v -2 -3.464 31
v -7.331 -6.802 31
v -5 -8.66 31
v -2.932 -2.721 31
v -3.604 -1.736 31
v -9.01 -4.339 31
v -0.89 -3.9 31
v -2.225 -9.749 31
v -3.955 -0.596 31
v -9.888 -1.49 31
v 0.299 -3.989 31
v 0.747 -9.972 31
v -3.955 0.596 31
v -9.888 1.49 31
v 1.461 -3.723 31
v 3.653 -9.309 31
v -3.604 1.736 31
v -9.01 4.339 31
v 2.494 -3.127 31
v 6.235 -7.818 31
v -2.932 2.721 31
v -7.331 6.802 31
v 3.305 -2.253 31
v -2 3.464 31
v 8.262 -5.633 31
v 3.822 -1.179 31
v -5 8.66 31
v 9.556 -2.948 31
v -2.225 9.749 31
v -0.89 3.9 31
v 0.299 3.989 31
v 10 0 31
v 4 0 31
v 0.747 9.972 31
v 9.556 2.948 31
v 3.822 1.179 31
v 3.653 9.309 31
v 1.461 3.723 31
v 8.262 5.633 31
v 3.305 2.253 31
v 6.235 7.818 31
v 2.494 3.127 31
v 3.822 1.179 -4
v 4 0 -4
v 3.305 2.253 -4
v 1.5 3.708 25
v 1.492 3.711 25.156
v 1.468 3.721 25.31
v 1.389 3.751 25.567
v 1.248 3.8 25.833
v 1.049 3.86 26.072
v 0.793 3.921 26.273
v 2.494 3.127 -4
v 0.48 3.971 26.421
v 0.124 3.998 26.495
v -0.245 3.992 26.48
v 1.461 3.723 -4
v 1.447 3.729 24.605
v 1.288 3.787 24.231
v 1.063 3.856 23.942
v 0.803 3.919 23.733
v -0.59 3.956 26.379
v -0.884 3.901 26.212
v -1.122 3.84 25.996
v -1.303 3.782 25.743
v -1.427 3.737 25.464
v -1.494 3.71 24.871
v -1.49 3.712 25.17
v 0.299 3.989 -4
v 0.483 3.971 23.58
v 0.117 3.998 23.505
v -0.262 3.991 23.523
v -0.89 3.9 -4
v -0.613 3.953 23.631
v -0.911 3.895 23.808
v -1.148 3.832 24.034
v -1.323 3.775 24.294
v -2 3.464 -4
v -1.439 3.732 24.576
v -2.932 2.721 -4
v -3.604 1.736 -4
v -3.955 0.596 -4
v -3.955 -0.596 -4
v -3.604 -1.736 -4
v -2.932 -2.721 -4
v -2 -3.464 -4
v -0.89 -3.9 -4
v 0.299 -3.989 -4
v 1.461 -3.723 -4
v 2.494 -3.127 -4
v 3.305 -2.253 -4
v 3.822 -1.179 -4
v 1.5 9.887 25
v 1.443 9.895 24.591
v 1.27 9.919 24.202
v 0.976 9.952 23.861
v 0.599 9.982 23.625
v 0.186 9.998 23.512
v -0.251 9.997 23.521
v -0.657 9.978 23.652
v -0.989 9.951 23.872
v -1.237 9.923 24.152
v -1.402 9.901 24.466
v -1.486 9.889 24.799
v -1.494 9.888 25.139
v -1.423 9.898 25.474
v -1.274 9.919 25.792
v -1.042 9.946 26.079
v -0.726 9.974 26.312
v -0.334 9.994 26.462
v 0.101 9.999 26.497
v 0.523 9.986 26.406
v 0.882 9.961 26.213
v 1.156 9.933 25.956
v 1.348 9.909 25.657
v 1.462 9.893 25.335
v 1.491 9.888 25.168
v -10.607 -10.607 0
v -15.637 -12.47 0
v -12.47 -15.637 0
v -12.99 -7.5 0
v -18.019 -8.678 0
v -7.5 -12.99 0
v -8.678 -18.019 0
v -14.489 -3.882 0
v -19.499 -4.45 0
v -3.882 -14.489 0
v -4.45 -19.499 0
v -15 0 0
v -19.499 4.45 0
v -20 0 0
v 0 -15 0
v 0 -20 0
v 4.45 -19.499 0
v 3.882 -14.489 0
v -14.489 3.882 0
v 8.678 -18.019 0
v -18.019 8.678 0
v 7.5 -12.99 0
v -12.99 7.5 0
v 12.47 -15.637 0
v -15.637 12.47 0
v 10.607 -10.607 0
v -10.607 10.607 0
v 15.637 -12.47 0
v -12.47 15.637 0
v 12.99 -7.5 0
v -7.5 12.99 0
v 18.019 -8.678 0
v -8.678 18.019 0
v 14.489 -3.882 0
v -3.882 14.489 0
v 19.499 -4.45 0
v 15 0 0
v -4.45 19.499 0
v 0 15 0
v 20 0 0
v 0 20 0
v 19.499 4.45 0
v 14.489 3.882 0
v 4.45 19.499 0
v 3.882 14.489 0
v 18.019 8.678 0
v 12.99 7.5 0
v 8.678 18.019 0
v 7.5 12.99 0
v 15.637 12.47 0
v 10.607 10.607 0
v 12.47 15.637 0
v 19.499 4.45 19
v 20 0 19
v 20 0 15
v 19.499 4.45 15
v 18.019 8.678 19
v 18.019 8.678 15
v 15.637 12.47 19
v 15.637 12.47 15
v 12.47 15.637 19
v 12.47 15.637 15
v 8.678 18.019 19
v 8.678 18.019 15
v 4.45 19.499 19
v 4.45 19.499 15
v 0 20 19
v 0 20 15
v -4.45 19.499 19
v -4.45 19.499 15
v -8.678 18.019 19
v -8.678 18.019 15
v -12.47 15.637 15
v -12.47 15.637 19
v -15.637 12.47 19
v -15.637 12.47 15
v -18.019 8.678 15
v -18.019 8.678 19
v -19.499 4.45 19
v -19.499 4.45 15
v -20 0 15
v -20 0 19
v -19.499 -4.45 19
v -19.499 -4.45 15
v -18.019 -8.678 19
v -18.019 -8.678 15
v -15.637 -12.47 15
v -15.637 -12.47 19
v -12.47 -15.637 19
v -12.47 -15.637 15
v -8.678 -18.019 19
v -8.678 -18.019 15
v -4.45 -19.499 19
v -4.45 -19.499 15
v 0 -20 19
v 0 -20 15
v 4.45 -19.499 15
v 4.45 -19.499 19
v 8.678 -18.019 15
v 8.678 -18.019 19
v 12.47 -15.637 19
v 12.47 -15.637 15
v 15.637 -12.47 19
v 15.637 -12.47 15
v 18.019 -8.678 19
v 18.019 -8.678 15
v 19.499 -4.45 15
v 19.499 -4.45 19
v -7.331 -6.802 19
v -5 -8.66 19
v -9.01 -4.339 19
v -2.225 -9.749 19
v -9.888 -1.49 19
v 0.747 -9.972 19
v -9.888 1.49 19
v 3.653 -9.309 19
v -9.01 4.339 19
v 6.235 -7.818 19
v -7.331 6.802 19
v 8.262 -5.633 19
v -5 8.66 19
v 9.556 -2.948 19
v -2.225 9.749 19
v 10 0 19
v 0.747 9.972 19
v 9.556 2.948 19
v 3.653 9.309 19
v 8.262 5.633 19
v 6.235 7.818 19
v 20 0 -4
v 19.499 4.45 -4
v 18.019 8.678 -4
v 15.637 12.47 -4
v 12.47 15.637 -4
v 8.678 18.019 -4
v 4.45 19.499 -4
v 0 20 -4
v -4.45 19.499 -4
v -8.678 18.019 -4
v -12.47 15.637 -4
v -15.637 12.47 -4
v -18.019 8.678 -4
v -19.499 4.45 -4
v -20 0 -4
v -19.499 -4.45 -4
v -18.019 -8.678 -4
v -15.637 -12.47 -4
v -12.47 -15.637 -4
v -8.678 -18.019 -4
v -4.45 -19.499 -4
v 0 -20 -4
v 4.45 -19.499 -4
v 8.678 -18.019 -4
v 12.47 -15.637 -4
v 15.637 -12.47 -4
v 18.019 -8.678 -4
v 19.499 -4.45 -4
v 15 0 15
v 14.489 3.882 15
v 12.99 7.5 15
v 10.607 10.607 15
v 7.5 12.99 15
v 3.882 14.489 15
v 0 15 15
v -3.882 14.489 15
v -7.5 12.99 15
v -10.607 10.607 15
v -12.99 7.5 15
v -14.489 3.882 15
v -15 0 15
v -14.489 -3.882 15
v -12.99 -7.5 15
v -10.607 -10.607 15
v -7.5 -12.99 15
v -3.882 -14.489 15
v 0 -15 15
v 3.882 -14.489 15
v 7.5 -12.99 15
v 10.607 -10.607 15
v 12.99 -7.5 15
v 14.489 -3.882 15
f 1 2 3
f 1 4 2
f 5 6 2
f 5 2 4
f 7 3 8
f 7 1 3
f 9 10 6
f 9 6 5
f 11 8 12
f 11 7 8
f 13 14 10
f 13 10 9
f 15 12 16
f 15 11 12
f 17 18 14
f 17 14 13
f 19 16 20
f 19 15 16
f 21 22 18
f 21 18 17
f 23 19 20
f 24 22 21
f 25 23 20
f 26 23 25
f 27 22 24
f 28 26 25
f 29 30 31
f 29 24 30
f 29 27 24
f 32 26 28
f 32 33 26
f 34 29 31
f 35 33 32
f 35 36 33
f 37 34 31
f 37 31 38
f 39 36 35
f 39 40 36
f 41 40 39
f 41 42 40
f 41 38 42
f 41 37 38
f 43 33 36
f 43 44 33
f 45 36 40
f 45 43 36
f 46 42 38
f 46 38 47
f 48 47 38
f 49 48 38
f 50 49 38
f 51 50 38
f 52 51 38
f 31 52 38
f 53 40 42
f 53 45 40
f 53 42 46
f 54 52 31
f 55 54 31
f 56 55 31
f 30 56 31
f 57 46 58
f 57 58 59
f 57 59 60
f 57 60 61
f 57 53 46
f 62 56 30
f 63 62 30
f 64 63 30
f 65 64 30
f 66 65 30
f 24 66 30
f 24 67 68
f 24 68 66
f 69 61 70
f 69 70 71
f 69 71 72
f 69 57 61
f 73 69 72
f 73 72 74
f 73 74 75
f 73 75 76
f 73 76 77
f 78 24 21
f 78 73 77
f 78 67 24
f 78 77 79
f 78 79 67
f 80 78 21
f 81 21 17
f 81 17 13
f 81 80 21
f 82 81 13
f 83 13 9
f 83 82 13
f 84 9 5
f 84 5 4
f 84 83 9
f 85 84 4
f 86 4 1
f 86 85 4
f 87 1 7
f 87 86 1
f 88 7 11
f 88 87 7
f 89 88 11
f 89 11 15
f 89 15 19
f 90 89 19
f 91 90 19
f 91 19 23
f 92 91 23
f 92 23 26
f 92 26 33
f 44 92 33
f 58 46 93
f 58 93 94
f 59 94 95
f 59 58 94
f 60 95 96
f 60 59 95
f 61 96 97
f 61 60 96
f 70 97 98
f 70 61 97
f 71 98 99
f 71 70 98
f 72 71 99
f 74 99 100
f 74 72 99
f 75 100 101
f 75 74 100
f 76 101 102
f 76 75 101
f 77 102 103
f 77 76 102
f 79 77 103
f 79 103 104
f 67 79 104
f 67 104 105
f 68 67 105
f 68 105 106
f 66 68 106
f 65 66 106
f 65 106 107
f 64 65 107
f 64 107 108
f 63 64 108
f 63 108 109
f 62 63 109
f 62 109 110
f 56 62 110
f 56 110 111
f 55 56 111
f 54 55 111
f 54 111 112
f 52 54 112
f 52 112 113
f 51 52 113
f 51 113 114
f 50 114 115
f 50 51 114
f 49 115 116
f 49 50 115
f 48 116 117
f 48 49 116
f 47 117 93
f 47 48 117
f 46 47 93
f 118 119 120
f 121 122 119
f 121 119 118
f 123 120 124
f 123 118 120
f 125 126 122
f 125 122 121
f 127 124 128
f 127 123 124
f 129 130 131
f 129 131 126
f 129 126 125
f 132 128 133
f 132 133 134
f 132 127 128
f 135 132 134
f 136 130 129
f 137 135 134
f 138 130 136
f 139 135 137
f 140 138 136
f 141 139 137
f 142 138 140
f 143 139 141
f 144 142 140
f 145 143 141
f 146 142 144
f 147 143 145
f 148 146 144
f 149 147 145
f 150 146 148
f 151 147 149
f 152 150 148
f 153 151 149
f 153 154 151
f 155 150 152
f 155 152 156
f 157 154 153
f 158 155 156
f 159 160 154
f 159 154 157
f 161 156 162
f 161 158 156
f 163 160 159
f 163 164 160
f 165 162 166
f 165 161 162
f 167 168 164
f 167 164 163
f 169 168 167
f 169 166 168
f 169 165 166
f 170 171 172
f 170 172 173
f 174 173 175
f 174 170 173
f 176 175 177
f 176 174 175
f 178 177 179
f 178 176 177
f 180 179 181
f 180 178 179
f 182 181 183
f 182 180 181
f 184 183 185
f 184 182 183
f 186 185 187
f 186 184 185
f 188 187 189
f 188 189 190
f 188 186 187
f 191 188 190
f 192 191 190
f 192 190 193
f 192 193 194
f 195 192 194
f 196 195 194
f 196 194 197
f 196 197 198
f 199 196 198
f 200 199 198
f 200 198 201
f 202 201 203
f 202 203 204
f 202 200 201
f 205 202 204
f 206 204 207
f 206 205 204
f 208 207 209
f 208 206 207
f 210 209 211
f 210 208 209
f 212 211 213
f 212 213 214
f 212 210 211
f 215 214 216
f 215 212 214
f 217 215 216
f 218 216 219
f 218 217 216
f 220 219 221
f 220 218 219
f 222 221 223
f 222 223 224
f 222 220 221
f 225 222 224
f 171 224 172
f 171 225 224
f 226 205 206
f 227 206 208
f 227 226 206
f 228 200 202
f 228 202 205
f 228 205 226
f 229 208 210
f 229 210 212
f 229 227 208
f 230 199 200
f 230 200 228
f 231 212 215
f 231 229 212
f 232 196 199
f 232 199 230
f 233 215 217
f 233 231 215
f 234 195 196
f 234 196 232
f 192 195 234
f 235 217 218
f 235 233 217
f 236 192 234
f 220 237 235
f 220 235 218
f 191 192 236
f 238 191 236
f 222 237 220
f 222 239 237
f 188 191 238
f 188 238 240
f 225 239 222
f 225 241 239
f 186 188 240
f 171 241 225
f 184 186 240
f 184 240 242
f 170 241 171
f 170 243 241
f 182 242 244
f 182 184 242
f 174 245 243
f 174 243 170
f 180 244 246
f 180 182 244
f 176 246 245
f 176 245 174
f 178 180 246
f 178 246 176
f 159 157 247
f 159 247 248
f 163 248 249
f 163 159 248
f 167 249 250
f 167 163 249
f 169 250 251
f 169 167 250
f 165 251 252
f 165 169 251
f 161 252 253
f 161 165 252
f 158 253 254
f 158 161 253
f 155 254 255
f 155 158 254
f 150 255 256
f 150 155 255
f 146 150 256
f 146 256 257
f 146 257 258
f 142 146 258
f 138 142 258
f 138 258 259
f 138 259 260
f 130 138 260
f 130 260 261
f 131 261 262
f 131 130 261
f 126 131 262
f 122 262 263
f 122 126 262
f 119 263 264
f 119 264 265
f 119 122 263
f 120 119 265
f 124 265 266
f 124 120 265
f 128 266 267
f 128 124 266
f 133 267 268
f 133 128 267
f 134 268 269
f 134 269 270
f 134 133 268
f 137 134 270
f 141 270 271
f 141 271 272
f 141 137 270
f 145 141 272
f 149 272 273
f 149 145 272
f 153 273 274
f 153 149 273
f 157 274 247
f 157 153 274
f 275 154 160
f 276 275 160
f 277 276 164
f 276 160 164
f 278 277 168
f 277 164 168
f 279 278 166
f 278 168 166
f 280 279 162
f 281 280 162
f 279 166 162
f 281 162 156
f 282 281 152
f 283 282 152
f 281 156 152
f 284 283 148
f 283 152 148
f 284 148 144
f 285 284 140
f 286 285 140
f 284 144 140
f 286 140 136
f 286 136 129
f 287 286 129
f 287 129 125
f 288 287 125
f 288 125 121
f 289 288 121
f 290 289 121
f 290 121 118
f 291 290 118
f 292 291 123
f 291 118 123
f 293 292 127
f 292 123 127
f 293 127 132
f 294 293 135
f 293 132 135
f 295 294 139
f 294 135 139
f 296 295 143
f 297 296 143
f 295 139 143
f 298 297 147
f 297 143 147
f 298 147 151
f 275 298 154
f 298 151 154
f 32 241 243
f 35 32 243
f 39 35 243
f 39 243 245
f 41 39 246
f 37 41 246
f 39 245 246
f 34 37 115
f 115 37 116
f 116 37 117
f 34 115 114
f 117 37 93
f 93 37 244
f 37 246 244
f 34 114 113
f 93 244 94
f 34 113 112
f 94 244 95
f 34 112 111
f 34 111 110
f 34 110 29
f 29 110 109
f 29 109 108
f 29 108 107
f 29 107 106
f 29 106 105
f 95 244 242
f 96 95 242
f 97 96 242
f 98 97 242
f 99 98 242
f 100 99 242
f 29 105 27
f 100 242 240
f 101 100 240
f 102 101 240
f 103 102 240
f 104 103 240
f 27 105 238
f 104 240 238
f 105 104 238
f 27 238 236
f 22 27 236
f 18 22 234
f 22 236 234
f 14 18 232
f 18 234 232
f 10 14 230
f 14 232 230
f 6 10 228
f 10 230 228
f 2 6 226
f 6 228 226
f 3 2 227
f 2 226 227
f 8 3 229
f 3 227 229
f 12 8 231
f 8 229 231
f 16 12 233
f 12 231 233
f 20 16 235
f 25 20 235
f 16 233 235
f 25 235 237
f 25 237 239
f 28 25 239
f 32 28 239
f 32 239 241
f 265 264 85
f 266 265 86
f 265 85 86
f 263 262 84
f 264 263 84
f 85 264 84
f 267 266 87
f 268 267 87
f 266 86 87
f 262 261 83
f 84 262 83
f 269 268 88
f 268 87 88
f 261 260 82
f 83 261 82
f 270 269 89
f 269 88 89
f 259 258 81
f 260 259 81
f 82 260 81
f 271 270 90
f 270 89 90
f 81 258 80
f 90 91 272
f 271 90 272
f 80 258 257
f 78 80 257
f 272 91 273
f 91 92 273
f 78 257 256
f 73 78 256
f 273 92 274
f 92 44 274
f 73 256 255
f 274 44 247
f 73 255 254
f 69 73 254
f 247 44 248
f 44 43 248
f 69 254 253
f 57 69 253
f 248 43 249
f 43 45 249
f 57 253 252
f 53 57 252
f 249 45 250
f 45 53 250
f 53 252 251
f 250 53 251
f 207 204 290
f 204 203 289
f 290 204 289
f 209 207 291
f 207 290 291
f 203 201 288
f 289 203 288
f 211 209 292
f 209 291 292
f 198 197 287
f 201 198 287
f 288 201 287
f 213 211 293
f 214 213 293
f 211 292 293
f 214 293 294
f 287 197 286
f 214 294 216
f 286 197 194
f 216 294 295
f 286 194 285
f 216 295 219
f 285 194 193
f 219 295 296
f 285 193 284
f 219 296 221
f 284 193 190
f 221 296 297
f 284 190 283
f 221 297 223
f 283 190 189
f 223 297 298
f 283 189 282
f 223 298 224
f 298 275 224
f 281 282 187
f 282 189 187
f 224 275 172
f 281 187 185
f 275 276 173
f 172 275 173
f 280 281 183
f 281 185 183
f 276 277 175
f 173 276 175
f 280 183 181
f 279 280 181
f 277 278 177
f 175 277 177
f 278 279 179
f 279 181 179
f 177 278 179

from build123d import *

# Parameters (mm, degrees)
SKETCH_1_R          = 20
EXTRUDE_1_DEPTH     = 4
SKETCH_1_3_R        = 15
EXTRUDE_2_DEPTH     = 15
EXTRUDE_START       = 4
SKETCH_2_R          = 20
EXTRUDE_3_DEPTH     = 4
SKETCH_3_R          = 10
SKETCH_3_R_2        = 4
EXTRUDE_4_DEPTH     = 12
SKETCH_4_R          = 1.5
CUT_EXTRUDE_1_DEPTH = 18
CUT_EXTRUDE_START   = -27
SKETCH_3_3_R        = 4
CUT_EXTRUDE_2_DEPTH = 27


with BuildPart() as part:
    # 스케치1 → 보스-돌출1 (new body)
    with BuildSketch(Plane.XY):
        Circle(SKETCH_1_R)
    extrude(amount=-EXTRUDE_1_DEPTH)

    # 스케치1<3> → 보스-돌출2 (add)
    with BuildSketch(Plane.XY):
        Circle(SKETCH_1_3_R)
    extrude(amount=EXTRUDE_2_DEPTH)

    # 스케치2 → 보스-돌출3 (add)
    with BuildSketch(Plane.XY.offset(15).offset(EXTRUDE_START)):
        Circle(SKETCH_2_R)
    extrude(amount=-EXTRUDE_3_DEPTH)

    # 스케치3 → 보스-돌출4 (add)
    with BuildSketch(Plane.XY.offset(19)):
        Circle(SKETCH_3_R)
        Circle(SKETCH_3_R_2, mode=Mode.SUBTRACT)
    extrude(amount=EXTRUDE_4_DEPTH)

    # 스케치4 → 컷-돌출1 (cut)
    with BuildSketch(Plane(origin=(0, 0, 0), x_dir=(1, 0, 0), z_dir=(0, 1, 0))):
        with Locations((0, -25)):
            Circle(SKETCH_4_R)
    extrude(amount=CUT_EXTRUDE_1_DEPTH, mode=Mode.SUBTRACT)

    # 스케치3<3> → 컷-돌출2 (cut)
    with BuildSketch(Plane.XY.offset(19).offset(CUT_EXTRUDE_START)):
        Circle(SKETCH_3_3_R)
    extrude(amount=CUT_EXTRUDE_2_DEPTH, mode=Mode.SUBTRACT)


solid = part.part
